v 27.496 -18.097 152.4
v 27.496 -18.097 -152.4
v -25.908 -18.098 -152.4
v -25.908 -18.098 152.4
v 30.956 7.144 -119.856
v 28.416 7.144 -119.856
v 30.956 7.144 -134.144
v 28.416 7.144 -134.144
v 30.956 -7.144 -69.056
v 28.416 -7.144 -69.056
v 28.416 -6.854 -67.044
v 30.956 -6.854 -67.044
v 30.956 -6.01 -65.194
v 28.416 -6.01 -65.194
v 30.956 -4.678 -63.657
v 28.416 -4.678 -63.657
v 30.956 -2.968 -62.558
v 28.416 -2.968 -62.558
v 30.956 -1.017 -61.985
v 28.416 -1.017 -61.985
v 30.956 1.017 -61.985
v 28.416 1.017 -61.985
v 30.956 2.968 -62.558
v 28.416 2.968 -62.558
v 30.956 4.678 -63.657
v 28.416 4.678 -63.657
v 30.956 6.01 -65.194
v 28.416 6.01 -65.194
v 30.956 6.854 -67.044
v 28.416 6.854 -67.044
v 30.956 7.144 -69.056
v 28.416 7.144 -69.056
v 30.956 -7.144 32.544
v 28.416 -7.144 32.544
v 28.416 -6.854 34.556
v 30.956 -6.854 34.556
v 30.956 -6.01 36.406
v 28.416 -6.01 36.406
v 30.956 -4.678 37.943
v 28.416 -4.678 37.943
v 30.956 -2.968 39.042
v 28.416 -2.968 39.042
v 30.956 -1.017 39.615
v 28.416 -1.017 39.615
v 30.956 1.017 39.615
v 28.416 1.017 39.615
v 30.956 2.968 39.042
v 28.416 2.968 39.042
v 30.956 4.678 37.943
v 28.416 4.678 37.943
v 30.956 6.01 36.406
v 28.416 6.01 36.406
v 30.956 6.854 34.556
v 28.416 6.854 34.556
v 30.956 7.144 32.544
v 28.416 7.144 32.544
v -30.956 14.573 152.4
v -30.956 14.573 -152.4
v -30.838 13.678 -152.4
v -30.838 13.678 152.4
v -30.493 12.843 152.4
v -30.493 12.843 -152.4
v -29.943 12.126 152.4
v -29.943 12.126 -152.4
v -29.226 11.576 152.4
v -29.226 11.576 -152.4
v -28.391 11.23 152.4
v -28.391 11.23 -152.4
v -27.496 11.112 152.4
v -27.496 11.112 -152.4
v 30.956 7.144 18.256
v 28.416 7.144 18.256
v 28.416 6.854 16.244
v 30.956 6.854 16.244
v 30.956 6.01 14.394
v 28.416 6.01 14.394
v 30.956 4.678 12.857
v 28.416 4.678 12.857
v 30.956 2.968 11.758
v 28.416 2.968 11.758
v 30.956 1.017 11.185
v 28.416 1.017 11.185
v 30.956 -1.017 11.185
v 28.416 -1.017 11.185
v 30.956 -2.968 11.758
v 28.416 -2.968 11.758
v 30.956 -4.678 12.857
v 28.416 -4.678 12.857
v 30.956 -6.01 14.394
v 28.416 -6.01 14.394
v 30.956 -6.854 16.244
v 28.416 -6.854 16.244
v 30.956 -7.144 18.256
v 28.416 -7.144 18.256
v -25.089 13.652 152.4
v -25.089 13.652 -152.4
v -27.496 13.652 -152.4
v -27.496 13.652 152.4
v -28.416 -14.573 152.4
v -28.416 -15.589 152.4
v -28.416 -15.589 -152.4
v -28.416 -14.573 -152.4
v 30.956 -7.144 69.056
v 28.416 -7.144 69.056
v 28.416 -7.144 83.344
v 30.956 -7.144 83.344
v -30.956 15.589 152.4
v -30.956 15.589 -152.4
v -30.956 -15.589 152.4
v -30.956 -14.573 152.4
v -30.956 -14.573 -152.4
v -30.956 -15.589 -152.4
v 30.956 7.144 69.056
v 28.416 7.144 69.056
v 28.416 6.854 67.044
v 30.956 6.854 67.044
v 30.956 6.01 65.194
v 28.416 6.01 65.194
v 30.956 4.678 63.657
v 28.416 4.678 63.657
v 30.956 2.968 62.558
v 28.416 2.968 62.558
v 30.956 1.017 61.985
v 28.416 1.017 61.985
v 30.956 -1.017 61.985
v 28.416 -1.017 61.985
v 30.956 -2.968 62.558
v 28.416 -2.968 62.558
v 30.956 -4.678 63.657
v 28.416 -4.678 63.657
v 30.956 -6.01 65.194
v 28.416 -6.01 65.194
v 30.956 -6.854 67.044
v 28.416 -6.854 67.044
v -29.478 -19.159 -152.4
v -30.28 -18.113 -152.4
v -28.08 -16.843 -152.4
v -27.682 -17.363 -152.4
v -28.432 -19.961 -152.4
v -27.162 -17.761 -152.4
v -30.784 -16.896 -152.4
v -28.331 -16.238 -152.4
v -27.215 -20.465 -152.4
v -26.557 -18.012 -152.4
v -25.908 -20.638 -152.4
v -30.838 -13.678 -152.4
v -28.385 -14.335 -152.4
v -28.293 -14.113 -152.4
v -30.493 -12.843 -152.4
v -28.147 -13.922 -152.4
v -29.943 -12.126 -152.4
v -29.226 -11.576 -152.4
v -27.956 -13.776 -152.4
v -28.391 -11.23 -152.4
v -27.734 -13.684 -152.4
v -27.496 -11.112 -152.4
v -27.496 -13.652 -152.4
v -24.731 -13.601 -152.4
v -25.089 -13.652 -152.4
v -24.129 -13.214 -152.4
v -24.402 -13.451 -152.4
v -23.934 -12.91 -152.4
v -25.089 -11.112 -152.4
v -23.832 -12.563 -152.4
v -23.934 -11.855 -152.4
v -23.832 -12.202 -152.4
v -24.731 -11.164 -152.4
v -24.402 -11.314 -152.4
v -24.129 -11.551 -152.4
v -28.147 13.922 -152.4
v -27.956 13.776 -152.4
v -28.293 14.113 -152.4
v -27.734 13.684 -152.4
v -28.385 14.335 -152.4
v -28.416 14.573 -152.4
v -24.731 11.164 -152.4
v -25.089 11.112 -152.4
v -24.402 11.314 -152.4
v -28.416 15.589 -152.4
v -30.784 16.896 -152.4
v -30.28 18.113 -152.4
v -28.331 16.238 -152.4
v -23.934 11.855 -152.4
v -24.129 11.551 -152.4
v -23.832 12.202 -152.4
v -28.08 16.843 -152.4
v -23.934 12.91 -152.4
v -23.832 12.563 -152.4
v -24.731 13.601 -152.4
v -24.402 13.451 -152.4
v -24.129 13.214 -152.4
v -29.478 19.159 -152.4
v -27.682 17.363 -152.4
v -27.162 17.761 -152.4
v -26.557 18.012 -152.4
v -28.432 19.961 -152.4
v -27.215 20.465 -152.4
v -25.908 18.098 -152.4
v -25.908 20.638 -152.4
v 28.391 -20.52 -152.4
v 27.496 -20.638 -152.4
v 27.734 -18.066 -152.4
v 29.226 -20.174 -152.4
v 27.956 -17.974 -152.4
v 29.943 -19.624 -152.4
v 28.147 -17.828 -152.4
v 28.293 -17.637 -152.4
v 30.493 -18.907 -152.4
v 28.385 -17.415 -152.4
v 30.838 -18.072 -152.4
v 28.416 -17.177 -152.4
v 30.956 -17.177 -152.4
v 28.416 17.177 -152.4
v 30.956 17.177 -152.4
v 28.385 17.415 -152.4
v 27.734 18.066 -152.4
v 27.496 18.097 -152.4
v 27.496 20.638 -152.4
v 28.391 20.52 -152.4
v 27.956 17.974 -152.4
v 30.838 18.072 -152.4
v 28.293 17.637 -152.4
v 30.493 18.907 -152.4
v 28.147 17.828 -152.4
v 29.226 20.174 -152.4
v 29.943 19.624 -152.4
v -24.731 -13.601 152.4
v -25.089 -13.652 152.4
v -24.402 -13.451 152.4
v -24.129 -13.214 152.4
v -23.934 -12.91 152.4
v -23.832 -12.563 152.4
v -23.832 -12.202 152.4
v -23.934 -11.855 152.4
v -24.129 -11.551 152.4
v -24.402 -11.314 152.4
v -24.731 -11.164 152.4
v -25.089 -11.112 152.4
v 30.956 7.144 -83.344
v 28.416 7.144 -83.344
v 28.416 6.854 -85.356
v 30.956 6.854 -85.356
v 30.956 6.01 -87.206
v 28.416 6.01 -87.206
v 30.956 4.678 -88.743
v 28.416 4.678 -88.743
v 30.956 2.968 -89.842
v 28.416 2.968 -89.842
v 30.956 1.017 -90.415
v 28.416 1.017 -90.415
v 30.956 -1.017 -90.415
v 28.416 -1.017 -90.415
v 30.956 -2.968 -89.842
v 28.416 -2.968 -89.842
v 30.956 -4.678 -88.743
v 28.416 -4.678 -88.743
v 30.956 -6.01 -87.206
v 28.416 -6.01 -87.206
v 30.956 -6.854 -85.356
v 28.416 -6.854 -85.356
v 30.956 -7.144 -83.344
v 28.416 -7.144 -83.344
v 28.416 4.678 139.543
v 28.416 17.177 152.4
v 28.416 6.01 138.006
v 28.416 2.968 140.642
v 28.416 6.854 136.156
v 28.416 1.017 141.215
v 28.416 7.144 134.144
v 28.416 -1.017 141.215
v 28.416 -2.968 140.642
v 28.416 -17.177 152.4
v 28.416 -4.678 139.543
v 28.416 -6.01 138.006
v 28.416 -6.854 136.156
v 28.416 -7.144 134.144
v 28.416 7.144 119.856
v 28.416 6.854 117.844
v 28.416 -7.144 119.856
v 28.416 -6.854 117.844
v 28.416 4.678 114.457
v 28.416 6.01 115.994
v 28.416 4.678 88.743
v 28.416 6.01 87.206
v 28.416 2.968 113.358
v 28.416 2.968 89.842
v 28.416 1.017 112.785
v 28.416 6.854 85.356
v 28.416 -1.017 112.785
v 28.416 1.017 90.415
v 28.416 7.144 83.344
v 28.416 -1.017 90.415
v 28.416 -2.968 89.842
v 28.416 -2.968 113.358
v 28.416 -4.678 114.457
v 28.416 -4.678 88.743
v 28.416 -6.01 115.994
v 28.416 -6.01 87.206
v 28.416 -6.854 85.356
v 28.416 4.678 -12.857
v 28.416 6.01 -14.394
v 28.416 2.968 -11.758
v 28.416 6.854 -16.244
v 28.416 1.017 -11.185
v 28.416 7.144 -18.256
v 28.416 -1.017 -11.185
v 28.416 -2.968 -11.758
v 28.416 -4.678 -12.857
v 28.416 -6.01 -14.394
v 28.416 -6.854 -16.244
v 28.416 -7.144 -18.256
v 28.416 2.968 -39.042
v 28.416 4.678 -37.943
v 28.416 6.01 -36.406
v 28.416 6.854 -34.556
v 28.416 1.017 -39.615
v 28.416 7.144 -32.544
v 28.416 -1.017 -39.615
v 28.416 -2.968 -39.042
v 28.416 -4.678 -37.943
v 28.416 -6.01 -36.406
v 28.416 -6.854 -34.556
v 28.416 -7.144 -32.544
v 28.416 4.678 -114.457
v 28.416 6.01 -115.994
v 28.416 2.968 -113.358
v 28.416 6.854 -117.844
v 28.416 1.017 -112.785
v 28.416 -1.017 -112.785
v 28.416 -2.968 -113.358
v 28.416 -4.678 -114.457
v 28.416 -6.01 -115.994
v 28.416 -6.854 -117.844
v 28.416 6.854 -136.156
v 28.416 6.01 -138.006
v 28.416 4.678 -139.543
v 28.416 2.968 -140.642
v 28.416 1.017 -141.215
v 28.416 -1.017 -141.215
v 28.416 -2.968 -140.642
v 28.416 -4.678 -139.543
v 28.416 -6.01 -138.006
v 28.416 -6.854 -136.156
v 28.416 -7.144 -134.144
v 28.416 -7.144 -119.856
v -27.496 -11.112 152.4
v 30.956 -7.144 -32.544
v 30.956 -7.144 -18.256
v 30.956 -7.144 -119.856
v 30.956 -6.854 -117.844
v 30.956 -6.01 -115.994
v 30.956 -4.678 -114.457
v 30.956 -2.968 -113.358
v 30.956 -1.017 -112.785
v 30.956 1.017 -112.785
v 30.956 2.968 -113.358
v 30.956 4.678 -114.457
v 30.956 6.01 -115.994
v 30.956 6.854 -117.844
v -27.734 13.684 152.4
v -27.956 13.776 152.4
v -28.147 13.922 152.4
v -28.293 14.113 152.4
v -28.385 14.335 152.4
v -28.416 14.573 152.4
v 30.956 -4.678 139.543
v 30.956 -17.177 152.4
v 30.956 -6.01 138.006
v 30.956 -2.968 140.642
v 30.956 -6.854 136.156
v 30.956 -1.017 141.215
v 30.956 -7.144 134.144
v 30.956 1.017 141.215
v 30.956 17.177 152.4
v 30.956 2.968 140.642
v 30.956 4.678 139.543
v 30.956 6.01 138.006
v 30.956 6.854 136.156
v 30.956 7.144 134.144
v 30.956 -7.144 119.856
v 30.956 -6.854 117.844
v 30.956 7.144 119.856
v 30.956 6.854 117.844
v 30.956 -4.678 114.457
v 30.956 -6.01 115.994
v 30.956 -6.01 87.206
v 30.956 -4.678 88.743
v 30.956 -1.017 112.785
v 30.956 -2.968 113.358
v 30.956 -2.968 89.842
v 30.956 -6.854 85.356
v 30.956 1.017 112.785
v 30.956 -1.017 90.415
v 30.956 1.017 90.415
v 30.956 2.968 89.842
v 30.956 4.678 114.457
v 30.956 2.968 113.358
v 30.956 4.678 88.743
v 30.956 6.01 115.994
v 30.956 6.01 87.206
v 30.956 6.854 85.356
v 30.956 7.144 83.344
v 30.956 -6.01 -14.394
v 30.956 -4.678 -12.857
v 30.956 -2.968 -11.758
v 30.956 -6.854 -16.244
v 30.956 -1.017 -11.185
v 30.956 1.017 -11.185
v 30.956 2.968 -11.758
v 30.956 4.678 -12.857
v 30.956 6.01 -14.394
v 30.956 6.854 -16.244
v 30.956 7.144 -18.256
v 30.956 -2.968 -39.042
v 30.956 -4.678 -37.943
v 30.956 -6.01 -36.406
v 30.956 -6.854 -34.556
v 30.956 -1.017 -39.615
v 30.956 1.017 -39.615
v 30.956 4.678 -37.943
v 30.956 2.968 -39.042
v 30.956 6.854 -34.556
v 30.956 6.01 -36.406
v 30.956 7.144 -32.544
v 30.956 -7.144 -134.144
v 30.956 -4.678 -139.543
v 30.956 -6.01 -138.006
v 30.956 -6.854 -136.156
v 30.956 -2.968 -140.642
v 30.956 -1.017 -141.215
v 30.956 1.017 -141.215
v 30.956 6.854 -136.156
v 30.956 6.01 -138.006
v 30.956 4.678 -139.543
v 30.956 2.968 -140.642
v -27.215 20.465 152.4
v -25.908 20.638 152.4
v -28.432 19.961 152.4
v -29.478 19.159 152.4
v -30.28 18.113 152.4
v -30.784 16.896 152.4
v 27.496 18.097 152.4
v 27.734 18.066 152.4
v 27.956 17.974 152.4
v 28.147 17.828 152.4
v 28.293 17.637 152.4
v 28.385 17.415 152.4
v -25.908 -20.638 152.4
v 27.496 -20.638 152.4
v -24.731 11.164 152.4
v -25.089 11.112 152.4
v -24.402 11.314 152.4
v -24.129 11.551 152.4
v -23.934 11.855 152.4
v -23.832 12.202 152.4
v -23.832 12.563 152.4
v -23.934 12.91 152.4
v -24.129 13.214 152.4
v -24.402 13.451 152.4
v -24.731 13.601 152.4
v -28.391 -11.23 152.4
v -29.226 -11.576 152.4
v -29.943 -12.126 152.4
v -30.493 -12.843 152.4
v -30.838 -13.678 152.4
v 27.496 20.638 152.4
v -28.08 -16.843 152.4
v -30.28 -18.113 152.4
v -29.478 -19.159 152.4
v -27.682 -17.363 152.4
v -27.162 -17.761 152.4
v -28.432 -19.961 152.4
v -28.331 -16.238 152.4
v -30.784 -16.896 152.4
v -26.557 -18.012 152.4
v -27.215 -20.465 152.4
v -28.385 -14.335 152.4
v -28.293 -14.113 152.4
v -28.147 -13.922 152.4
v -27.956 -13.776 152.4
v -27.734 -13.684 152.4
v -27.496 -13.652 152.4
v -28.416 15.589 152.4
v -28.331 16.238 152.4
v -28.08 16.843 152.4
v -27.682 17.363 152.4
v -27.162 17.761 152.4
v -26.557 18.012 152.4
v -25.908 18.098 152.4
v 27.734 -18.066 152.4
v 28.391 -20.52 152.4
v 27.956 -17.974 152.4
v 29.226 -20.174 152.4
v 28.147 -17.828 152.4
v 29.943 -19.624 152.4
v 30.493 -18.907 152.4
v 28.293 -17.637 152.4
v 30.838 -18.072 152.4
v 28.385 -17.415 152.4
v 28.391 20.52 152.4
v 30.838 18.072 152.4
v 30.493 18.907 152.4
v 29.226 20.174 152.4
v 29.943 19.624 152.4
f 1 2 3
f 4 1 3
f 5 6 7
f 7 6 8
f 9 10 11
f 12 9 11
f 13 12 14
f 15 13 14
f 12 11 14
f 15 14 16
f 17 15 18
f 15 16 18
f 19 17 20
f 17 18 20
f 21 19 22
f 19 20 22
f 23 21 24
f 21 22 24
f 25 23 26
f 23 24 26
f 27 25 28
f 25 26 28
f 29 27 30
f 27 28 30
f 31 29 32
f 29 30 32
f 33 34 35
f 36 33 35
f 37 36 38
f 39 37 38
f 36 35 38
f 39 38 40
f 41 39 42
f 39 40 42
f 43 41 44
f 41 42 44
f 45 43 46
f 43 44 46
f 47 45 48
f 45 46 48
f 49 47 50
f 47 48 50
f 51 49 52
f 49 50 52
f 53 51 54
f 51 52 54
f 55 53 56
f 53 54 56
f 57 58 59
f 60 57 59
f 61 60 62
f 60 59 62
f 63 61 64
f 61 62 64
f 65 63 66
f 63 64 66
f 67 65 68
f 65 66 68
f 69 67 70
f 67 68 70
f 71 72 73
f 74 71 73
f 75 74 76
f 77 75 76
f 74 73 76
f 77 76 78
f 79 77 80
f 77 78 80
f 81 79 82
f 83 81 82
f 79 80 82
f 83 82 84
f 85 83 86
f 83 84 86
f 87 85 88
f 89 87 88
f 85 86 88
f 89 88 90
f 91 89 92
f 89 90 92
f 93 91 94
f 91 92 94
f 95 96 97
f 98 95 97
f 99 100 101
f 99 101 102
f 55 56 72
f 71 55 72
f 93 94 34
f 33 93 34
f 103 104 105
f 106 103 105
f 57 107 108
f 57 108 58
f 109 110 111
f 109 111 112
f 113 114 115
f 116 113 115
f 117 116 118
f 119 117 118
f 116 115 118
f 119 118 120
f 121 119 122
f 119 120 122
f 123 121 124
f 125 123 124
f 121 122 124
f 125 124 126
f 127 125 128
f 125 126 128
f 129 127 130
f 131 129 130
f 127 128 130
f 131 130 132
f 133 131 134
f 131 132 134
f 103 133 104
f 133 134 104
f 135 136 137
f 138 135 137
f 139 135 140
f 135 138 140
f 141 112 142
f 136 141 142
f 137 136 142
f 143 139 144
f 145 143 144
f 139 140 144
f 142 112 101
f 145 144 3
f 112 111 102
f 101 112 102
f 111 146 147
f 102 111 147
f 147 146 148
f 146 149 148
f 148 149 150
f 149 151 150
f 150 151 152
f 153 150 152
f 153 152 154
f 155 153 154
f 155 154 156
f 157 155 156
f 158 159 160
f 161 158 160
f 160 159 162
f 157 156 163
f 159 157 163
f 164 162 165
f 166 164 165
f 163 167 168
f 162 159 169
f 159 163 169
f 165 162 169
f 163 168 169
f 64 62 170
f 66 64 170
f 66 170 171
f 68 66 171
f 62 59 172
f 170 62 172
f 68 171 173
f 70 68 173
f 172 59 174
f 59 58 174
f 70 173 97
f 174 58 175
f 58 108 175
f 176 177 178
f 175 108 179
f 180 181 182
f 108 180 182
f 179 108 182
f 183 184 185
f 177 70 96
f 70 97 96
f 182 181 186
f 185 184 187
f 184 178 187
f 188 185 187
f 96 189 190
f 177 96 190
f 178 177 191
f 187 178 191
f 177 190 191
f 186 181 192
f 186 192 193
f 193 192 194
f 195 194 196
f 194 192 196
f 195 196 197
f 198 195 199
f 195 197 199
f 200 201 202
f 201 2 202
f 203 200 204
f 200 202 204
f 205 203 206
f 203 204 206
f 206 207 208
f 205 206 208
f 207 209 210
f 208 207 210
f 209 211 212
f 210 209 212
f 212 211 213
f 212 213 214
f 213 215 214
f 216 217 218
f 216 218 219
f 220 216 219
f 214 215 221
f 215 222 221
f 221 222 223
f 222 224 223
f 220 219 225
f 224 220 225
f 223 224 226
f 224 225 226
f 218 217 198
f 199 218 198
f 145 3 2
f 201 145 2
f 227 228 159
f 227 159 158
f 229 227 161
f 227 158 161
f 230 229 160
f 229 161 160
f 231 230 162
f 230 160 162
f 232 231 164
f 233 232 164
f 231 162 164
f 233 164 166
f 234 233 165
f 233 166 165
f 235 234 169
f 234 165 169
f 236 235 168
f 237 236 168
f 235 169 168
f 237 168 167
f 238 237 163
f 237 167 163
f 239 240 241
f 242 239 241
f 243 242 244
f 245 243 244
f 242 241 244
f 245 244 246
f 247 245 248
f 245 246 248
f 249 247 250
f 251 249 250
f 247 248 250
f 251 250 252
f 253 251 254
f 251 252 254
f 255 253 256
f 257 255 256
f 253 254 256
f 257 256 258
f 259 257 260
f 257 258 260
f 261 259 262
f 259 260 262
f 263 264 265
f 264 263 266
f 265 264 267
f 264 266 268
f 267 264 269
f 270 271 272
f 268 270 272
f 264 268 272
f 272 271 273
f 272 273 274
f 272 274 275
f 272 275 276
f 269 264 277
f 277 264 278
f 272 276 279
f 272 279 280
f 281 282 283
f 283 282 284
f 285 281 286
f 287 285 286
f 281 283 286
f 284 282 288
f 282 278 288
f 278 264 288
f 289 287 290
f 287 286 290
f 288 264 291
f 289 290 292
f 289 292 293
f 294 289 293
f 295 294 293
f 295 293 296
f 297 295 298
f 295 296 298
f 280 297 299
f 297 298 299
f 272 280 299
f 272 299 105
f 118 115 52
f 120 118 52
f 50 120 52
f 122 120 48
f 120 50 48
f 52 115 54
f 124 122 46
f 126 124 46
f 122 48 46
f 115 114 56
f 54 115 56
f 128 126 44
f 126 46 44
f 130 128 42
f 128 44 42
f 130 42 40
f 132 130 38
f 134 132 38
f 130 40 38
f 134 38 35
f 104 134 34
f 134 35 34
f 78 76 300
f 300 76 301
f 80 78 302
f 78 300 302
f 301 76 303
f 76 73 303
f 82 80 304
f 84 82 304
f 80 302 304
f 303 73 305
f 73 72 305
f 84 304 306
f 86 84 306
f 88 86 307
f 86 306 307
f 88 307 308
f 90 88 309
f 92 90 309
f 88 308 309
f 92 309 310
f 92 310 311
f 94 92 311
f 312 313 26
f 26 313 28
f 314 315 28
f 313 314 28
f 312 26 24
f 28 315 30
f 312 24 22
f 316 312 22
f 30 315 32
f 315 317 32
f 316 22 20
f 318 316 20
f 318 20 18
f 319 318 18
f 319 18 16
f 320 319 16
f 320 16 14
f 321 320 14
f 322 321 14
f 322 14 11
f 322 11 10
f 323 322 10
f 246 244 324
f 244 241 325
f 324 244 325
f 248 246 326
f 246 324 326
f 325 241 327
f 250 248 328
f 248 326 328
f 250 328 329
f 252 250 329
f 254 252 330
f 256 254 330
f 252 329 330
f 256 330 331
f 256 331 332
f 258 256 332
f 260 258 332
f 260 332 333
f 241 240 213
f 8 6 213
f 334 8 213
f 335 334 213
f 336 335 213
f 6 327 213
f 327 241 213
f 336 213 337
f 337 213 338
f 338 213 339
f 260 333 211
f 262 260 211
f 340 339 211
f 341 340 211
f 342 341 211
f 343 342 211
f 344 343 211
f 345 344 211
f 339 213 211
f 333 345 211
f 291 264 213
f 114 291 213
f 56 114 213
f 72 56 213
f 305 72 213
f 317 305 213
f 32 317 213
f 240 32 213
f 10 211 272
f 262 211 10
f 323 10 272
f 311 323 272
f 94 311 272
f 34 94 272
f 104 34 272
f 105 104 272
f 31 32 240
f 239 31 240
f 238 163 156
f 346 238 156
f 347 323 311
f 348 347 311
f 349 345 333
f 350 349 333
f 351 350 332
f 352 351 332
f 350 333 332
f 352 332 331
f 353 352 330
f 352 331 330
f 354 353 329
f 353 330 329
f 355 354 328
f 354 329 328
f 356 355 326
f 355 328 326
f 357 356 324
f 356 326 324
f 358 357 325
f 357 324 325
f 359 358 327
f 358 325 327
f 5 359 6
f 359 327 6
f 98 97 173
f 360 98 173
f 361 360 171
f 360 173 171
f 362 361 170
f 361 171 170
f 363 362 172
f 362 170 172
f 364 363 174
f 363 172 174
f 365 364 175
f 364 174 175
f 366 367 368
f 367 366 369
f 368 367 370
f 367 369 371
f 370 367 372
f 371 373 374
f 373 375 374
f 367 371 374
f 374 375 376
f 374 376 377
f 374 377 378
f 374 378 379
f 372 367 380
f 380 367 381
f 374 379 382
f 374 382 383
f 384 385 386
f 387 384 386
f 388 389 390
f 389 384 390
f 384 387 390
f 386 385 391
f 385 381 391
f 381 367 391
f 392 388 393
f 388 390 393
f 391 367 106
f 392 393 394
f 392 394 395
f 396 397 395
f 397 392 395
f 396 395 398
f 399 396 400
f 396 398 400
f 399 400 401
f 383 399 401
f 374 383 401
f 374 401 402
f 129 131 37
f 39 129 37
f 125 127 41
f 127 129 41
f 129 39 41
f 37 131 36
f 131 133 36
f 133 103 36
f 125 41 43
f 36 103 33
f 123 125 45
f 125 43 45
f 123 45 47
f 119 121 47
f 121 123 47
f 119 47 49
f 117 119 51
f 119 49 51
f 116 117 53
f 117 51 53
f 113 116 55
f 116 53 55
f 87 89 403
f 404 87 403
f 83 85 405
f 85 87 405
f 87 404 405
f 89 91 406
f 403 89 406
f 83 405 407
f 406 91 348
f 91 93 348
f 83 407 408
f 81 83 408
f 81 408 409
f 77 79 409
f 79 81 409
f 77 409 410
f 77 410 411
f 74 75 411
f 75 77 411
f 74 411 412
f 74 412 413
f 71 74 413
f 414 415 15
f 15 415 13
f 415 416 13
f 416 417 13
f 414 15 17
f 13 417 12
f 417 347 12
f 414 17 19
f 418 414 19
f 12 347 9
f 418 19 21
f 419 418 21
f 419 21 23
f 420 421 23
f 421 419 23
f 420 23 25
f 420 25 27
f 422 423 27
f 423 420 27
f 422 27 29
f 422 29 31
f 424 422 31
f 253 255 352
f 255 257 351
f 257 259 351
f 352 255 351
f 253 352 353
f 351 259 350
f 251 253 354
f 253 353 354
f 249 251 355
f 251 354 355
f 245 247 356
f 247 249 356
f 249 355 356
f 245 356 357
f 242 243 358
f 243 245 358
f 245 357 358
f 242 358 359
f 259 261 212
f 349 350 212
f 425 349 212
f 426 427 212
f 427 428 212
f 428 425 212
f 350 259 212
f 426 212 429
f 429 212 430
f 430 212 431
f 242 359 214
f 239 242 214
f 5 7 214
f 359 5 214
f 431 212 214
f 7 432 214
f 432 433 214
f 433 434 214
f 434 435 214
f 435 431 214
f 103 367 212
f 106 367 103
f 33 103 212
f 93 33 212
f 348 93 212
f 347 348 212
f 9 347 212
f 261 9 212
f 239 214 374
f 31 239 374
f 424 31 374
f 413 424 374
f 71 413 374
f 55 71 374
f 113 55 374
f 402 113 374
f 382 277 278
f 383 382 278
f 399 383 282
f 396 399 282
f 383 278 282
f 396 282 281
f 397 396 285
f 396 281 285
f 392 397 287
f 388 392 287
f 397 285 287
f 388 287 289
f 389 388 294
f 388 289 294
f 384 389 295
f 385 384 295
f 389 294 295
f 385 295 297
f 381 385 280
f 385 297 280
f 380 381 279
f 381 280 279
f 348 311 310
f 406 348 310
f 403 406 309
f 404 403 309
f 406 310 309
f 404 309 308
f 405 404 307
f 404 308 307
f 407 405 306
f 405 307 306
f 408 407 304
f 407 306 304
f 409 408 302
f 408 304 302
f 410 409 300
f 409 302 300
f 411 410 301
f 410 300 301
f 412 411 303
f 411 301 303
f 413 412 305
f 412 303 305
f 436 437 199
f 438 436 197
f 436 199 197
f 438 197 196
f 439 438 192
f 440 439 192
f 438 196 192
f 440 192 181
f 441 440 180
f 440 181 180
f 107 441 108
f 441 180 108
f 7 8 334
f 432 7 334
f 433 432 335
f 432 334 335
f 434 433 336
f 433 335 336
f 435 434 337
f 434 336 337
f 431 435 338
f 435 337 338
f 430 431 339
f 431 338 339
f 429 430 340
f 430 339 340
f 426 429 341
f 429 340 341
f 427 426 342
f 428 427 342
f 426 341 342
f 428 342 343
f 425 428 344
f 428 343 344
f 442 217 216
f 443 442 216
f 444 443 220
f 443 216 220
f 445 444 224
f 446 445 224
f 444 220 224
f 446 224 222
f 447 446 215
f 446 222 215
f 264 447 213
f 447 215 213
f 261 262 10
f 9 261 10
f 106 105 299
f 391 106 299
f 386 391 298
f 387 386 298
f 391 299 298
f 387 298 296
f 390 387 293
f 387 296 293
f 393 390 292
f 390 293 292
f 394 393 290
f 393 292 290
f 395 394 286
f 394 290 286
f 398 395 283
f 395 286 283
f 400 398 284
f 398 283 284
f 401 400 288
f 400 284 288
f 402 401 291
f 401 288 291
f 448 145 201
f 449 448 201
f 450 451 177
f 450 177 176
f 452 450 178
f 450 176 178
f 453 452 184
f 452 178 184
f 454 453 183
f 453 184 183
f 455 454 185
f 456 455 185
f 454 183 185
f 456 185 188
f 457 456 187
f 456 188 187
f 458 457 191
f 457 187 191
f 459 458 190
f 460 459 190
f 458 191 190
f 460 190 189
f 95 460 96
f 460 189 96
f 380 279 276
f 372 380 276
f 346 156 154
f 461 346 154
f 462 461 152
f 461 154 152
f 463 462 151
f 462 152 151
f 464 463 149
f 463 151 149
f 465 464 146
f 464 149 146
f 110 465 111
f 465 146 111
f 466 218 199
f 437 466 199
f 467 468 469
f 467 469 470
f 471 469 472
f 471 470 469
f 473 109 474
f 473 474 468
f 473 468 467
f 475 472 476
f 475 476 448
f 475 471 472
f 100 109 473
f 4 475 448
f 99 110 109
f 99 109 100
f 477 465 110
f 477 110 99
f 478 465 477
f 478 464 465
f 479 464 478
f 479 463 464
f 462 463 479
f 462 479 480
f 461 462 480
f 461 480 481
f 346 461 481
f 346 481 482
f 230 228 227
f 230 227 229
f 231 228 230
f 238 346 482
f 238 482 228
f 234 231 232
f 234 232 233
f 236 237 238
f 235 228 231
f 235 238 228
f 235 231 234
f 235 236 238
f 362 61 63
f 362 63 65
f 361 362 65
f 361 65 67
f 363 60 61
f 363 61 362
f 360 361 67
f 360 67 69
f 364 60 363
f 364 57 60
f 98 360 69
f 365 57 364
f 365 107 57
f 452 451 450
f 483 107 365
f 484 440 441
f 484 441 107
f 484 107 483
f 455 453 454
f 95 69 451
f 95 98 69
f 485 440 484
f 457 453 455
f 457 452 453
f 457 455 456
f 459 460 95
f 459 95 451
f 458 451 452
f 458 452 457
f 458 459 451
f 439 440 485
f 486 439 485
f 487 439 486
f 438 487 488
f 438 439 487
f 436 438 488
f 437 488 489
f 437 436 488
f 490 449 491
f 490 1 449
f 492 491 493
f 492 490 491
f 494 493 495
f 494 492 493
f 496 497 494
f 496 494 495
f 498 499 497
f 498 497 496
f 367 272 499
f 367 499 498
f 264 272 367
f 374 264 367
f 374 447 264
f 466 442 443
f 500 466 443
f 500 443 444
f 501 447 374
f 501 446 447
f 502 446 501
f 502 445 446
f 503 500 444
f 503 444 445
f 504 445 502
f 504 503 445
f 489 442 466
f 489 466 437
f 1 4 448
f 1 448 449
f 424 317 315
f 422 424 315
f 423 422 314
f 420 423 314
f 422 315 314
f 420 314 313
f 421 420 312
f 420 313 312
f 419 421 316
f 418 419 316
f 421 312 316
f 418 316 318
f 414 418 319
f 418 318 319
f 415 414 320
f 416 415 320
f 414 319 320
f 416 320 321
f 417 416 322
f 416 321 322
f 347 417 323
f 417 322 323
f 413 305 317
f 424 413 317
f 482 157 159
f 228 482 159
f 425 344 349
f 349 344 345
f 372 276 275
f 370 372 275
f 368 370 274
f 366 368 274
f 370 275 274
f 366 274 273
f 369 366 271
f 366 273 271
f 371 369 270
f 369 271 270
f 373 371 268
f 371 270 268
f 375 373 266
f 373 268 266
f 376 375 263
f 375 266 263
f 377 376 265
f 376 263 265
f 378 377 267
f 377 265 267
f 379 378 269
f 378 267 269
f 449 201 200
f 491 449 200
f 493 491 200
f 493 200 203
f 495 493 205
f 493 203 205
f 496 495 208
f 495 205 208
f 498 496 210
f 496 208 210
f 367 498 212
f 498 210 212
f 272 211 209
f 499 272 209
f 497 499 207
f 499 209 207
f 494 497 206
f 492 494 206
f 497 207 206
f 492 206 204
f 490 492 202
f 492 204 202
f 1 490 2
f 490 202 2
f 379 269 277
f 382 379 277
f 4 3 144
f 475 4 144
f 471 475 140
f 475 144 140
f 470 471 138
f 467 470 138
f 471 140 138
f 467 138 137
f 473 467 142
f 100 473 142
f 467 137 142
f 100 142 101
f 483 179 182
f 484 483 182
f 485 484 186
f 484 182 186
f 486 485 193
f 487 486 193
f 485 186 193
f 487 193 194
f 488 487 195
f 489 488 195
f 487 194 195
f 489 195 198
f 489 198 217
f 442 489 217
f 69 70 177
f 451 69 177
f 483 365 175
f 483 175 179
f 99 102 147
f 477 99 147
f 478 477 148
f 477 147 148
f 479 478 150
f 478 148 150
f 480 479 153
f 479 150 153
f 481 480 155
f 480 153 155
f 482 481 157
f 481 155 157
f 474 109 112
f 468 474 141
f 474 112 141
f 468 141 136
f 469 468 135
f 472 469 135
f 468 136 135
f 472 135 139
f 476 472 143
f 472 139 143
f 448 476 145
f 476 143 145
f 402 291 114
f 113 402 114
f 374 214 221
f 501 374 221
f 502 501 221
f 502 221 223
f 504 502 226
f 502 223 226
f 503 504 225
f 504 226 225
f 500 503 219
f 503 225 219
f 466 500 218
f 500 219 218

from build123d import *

# Parameters (mm, degrees)
BOSS_EXTRUDE1_DEPTH      = 152.4
BOSS_EXTRUDE1_DEPTH_BACK = 152.4
CUT_EXTRUDE1_DEPTH       = 157.875606199
LPATTERN1_COUNT          = 6
LPATTERN1_PITCH          = 50.8


with BuildPart() as part:
    # Sketch5 → Boss-Extrude1 (new, two sides: drawn at the far end of the back side and taken through both)
    with BuildSketch(Plane.XY.offset(-BOSS_EXTRUDE1_DEPTH_BACK)):
        with BuildLine():
            Line((-25.908, -20.6375), (27.4955, -20.6375))
            ThreePointArc((27.4955, -20.6375), (29.942619793, -19.623869793), (30.95625, -17.17675))
            Line((30.95625, -17.17675), (30.95625, 17.17675))
            ThreePointArc((30.95625, 17.17675), (29.942619793, 19.623869793), (27.4955, 20.6375))
            Line((27.4955, 20.6375), (-25.908, 20.6375))
            ThreePointArc((-25.908, 20.6375), (-29.477651808, 19.158901808), (-30.95625, 15.58925))
            Line((-30.95625, 15.58925), (-30.95625, 14.57325))
            ThreePointArc((-30.95625, 14.57325), (-29.942619793, 12.126130207), (-27.4955, 11.1125))
            Line((-27.4955, 11.1125), (-25.08885, 11.1125))
            ThreePointArc((-25.08885, 11.1125), (-23.81885, 12.3825), (-25.08885, 13.6525))
            Line((-25.08885, 13.6525), (-27.4955, 13.6525))
            ThreePointArc((-27.4955, 13.6525), (-28.146568569, 13.922181431), (-28.41625, 14.57325))
            Line((-28.41625, 14.57325), (-28.41625, 15.58925))
            ThreePointArc((-28.41625, 15.58925), (-27.681600584, 17.362850584), (-25.908, 18.0975))
            Line((-25.908, 18.0975), (27.4955, 18.0975))
            ThreePointArc((27.4955, 18.0975), (28.146568569, 17.827818569), (28.41625, 17.17675))
            Line((28.41625, 17.17675), (28.41625, -17.17675))
            ThreePointArc((28.41625, -17.17675), (28.146568569, -17.827818569), (27.4955, -18.0975))
            Line((27.4955, -18.0975), (-25.908, -18.0975))
            ThreePointArc((-25.908, -18.0975), (-27.681600584, -17.362850584), (-28.41625, -15.58925))
            Line((-28.41625, -15.58925), (-28.41625, -14.57325))
            ThreePointArc((-28.41625, -14.57325), (-28.146568569, -13.922181431), (-27.4955, -13.6525))
            Line((-27.4955, -13.6525), (-25.08885, -13.6525))
            ThreePointArc((-25.08885, -13.6525), (-23.81885, -12.3825), (-25.08885, -11.1125))
            Line((-25.08885, -11.1125), (-27.4955, -11.1125))
            ThreePointArc((-27.4955, -11.1125), (-29.942619793, -12.126130207), (-30.95625, -14.57325))
            Line((-30.95625, -14.57325), (-30.95625, -15.58925))
            ThreePointArc((-30.95625, -15.58925), (-29.477651808, -19.158901808), (-25.908, -20.6375))
        make_face()
    extrude(amount=BOSS_EXTRUDE1_DEPTH + BOSS_EXTRUDE1_DEPTH_BACK)

    # Sketch2 → Cut-Extrude1 (cut, through all)
    with BuildSketch(Plane(origin=(0, 0, 0), x_dir=(0, 0, -1), z_dir=(1, 0, 0))):
        with BuildLine():
            Line((-134.14375, 7.14375), (-119.85625, 7.14375))
            ThreePointArc((-119.85625, 7.14375), (-112.7125, 0), (-119.85625, -7.14375))
            Line((-119.85625, -7.14375), (-134.14375, -7.14375))
            ThreePointArc((-134.14375, -7.14375), (-141.2875, 0), (-134.14375, 7.14375))
        make_face()
    cut_extrude1 = extrude(amount=CUT_EXTRUDE1_DEPTH, mode=Mode.SUBTRACT)

    # LPattern1: Cut-Extrude1 ×6
    with Locations(*[(0, 0, -i * LPATTERN1_PITCH) for i in range(1, LPATTERN1_COUNT)]):
        add(cut_extrude1, mode=Mode.SUBTRACT)


solid = part.part
